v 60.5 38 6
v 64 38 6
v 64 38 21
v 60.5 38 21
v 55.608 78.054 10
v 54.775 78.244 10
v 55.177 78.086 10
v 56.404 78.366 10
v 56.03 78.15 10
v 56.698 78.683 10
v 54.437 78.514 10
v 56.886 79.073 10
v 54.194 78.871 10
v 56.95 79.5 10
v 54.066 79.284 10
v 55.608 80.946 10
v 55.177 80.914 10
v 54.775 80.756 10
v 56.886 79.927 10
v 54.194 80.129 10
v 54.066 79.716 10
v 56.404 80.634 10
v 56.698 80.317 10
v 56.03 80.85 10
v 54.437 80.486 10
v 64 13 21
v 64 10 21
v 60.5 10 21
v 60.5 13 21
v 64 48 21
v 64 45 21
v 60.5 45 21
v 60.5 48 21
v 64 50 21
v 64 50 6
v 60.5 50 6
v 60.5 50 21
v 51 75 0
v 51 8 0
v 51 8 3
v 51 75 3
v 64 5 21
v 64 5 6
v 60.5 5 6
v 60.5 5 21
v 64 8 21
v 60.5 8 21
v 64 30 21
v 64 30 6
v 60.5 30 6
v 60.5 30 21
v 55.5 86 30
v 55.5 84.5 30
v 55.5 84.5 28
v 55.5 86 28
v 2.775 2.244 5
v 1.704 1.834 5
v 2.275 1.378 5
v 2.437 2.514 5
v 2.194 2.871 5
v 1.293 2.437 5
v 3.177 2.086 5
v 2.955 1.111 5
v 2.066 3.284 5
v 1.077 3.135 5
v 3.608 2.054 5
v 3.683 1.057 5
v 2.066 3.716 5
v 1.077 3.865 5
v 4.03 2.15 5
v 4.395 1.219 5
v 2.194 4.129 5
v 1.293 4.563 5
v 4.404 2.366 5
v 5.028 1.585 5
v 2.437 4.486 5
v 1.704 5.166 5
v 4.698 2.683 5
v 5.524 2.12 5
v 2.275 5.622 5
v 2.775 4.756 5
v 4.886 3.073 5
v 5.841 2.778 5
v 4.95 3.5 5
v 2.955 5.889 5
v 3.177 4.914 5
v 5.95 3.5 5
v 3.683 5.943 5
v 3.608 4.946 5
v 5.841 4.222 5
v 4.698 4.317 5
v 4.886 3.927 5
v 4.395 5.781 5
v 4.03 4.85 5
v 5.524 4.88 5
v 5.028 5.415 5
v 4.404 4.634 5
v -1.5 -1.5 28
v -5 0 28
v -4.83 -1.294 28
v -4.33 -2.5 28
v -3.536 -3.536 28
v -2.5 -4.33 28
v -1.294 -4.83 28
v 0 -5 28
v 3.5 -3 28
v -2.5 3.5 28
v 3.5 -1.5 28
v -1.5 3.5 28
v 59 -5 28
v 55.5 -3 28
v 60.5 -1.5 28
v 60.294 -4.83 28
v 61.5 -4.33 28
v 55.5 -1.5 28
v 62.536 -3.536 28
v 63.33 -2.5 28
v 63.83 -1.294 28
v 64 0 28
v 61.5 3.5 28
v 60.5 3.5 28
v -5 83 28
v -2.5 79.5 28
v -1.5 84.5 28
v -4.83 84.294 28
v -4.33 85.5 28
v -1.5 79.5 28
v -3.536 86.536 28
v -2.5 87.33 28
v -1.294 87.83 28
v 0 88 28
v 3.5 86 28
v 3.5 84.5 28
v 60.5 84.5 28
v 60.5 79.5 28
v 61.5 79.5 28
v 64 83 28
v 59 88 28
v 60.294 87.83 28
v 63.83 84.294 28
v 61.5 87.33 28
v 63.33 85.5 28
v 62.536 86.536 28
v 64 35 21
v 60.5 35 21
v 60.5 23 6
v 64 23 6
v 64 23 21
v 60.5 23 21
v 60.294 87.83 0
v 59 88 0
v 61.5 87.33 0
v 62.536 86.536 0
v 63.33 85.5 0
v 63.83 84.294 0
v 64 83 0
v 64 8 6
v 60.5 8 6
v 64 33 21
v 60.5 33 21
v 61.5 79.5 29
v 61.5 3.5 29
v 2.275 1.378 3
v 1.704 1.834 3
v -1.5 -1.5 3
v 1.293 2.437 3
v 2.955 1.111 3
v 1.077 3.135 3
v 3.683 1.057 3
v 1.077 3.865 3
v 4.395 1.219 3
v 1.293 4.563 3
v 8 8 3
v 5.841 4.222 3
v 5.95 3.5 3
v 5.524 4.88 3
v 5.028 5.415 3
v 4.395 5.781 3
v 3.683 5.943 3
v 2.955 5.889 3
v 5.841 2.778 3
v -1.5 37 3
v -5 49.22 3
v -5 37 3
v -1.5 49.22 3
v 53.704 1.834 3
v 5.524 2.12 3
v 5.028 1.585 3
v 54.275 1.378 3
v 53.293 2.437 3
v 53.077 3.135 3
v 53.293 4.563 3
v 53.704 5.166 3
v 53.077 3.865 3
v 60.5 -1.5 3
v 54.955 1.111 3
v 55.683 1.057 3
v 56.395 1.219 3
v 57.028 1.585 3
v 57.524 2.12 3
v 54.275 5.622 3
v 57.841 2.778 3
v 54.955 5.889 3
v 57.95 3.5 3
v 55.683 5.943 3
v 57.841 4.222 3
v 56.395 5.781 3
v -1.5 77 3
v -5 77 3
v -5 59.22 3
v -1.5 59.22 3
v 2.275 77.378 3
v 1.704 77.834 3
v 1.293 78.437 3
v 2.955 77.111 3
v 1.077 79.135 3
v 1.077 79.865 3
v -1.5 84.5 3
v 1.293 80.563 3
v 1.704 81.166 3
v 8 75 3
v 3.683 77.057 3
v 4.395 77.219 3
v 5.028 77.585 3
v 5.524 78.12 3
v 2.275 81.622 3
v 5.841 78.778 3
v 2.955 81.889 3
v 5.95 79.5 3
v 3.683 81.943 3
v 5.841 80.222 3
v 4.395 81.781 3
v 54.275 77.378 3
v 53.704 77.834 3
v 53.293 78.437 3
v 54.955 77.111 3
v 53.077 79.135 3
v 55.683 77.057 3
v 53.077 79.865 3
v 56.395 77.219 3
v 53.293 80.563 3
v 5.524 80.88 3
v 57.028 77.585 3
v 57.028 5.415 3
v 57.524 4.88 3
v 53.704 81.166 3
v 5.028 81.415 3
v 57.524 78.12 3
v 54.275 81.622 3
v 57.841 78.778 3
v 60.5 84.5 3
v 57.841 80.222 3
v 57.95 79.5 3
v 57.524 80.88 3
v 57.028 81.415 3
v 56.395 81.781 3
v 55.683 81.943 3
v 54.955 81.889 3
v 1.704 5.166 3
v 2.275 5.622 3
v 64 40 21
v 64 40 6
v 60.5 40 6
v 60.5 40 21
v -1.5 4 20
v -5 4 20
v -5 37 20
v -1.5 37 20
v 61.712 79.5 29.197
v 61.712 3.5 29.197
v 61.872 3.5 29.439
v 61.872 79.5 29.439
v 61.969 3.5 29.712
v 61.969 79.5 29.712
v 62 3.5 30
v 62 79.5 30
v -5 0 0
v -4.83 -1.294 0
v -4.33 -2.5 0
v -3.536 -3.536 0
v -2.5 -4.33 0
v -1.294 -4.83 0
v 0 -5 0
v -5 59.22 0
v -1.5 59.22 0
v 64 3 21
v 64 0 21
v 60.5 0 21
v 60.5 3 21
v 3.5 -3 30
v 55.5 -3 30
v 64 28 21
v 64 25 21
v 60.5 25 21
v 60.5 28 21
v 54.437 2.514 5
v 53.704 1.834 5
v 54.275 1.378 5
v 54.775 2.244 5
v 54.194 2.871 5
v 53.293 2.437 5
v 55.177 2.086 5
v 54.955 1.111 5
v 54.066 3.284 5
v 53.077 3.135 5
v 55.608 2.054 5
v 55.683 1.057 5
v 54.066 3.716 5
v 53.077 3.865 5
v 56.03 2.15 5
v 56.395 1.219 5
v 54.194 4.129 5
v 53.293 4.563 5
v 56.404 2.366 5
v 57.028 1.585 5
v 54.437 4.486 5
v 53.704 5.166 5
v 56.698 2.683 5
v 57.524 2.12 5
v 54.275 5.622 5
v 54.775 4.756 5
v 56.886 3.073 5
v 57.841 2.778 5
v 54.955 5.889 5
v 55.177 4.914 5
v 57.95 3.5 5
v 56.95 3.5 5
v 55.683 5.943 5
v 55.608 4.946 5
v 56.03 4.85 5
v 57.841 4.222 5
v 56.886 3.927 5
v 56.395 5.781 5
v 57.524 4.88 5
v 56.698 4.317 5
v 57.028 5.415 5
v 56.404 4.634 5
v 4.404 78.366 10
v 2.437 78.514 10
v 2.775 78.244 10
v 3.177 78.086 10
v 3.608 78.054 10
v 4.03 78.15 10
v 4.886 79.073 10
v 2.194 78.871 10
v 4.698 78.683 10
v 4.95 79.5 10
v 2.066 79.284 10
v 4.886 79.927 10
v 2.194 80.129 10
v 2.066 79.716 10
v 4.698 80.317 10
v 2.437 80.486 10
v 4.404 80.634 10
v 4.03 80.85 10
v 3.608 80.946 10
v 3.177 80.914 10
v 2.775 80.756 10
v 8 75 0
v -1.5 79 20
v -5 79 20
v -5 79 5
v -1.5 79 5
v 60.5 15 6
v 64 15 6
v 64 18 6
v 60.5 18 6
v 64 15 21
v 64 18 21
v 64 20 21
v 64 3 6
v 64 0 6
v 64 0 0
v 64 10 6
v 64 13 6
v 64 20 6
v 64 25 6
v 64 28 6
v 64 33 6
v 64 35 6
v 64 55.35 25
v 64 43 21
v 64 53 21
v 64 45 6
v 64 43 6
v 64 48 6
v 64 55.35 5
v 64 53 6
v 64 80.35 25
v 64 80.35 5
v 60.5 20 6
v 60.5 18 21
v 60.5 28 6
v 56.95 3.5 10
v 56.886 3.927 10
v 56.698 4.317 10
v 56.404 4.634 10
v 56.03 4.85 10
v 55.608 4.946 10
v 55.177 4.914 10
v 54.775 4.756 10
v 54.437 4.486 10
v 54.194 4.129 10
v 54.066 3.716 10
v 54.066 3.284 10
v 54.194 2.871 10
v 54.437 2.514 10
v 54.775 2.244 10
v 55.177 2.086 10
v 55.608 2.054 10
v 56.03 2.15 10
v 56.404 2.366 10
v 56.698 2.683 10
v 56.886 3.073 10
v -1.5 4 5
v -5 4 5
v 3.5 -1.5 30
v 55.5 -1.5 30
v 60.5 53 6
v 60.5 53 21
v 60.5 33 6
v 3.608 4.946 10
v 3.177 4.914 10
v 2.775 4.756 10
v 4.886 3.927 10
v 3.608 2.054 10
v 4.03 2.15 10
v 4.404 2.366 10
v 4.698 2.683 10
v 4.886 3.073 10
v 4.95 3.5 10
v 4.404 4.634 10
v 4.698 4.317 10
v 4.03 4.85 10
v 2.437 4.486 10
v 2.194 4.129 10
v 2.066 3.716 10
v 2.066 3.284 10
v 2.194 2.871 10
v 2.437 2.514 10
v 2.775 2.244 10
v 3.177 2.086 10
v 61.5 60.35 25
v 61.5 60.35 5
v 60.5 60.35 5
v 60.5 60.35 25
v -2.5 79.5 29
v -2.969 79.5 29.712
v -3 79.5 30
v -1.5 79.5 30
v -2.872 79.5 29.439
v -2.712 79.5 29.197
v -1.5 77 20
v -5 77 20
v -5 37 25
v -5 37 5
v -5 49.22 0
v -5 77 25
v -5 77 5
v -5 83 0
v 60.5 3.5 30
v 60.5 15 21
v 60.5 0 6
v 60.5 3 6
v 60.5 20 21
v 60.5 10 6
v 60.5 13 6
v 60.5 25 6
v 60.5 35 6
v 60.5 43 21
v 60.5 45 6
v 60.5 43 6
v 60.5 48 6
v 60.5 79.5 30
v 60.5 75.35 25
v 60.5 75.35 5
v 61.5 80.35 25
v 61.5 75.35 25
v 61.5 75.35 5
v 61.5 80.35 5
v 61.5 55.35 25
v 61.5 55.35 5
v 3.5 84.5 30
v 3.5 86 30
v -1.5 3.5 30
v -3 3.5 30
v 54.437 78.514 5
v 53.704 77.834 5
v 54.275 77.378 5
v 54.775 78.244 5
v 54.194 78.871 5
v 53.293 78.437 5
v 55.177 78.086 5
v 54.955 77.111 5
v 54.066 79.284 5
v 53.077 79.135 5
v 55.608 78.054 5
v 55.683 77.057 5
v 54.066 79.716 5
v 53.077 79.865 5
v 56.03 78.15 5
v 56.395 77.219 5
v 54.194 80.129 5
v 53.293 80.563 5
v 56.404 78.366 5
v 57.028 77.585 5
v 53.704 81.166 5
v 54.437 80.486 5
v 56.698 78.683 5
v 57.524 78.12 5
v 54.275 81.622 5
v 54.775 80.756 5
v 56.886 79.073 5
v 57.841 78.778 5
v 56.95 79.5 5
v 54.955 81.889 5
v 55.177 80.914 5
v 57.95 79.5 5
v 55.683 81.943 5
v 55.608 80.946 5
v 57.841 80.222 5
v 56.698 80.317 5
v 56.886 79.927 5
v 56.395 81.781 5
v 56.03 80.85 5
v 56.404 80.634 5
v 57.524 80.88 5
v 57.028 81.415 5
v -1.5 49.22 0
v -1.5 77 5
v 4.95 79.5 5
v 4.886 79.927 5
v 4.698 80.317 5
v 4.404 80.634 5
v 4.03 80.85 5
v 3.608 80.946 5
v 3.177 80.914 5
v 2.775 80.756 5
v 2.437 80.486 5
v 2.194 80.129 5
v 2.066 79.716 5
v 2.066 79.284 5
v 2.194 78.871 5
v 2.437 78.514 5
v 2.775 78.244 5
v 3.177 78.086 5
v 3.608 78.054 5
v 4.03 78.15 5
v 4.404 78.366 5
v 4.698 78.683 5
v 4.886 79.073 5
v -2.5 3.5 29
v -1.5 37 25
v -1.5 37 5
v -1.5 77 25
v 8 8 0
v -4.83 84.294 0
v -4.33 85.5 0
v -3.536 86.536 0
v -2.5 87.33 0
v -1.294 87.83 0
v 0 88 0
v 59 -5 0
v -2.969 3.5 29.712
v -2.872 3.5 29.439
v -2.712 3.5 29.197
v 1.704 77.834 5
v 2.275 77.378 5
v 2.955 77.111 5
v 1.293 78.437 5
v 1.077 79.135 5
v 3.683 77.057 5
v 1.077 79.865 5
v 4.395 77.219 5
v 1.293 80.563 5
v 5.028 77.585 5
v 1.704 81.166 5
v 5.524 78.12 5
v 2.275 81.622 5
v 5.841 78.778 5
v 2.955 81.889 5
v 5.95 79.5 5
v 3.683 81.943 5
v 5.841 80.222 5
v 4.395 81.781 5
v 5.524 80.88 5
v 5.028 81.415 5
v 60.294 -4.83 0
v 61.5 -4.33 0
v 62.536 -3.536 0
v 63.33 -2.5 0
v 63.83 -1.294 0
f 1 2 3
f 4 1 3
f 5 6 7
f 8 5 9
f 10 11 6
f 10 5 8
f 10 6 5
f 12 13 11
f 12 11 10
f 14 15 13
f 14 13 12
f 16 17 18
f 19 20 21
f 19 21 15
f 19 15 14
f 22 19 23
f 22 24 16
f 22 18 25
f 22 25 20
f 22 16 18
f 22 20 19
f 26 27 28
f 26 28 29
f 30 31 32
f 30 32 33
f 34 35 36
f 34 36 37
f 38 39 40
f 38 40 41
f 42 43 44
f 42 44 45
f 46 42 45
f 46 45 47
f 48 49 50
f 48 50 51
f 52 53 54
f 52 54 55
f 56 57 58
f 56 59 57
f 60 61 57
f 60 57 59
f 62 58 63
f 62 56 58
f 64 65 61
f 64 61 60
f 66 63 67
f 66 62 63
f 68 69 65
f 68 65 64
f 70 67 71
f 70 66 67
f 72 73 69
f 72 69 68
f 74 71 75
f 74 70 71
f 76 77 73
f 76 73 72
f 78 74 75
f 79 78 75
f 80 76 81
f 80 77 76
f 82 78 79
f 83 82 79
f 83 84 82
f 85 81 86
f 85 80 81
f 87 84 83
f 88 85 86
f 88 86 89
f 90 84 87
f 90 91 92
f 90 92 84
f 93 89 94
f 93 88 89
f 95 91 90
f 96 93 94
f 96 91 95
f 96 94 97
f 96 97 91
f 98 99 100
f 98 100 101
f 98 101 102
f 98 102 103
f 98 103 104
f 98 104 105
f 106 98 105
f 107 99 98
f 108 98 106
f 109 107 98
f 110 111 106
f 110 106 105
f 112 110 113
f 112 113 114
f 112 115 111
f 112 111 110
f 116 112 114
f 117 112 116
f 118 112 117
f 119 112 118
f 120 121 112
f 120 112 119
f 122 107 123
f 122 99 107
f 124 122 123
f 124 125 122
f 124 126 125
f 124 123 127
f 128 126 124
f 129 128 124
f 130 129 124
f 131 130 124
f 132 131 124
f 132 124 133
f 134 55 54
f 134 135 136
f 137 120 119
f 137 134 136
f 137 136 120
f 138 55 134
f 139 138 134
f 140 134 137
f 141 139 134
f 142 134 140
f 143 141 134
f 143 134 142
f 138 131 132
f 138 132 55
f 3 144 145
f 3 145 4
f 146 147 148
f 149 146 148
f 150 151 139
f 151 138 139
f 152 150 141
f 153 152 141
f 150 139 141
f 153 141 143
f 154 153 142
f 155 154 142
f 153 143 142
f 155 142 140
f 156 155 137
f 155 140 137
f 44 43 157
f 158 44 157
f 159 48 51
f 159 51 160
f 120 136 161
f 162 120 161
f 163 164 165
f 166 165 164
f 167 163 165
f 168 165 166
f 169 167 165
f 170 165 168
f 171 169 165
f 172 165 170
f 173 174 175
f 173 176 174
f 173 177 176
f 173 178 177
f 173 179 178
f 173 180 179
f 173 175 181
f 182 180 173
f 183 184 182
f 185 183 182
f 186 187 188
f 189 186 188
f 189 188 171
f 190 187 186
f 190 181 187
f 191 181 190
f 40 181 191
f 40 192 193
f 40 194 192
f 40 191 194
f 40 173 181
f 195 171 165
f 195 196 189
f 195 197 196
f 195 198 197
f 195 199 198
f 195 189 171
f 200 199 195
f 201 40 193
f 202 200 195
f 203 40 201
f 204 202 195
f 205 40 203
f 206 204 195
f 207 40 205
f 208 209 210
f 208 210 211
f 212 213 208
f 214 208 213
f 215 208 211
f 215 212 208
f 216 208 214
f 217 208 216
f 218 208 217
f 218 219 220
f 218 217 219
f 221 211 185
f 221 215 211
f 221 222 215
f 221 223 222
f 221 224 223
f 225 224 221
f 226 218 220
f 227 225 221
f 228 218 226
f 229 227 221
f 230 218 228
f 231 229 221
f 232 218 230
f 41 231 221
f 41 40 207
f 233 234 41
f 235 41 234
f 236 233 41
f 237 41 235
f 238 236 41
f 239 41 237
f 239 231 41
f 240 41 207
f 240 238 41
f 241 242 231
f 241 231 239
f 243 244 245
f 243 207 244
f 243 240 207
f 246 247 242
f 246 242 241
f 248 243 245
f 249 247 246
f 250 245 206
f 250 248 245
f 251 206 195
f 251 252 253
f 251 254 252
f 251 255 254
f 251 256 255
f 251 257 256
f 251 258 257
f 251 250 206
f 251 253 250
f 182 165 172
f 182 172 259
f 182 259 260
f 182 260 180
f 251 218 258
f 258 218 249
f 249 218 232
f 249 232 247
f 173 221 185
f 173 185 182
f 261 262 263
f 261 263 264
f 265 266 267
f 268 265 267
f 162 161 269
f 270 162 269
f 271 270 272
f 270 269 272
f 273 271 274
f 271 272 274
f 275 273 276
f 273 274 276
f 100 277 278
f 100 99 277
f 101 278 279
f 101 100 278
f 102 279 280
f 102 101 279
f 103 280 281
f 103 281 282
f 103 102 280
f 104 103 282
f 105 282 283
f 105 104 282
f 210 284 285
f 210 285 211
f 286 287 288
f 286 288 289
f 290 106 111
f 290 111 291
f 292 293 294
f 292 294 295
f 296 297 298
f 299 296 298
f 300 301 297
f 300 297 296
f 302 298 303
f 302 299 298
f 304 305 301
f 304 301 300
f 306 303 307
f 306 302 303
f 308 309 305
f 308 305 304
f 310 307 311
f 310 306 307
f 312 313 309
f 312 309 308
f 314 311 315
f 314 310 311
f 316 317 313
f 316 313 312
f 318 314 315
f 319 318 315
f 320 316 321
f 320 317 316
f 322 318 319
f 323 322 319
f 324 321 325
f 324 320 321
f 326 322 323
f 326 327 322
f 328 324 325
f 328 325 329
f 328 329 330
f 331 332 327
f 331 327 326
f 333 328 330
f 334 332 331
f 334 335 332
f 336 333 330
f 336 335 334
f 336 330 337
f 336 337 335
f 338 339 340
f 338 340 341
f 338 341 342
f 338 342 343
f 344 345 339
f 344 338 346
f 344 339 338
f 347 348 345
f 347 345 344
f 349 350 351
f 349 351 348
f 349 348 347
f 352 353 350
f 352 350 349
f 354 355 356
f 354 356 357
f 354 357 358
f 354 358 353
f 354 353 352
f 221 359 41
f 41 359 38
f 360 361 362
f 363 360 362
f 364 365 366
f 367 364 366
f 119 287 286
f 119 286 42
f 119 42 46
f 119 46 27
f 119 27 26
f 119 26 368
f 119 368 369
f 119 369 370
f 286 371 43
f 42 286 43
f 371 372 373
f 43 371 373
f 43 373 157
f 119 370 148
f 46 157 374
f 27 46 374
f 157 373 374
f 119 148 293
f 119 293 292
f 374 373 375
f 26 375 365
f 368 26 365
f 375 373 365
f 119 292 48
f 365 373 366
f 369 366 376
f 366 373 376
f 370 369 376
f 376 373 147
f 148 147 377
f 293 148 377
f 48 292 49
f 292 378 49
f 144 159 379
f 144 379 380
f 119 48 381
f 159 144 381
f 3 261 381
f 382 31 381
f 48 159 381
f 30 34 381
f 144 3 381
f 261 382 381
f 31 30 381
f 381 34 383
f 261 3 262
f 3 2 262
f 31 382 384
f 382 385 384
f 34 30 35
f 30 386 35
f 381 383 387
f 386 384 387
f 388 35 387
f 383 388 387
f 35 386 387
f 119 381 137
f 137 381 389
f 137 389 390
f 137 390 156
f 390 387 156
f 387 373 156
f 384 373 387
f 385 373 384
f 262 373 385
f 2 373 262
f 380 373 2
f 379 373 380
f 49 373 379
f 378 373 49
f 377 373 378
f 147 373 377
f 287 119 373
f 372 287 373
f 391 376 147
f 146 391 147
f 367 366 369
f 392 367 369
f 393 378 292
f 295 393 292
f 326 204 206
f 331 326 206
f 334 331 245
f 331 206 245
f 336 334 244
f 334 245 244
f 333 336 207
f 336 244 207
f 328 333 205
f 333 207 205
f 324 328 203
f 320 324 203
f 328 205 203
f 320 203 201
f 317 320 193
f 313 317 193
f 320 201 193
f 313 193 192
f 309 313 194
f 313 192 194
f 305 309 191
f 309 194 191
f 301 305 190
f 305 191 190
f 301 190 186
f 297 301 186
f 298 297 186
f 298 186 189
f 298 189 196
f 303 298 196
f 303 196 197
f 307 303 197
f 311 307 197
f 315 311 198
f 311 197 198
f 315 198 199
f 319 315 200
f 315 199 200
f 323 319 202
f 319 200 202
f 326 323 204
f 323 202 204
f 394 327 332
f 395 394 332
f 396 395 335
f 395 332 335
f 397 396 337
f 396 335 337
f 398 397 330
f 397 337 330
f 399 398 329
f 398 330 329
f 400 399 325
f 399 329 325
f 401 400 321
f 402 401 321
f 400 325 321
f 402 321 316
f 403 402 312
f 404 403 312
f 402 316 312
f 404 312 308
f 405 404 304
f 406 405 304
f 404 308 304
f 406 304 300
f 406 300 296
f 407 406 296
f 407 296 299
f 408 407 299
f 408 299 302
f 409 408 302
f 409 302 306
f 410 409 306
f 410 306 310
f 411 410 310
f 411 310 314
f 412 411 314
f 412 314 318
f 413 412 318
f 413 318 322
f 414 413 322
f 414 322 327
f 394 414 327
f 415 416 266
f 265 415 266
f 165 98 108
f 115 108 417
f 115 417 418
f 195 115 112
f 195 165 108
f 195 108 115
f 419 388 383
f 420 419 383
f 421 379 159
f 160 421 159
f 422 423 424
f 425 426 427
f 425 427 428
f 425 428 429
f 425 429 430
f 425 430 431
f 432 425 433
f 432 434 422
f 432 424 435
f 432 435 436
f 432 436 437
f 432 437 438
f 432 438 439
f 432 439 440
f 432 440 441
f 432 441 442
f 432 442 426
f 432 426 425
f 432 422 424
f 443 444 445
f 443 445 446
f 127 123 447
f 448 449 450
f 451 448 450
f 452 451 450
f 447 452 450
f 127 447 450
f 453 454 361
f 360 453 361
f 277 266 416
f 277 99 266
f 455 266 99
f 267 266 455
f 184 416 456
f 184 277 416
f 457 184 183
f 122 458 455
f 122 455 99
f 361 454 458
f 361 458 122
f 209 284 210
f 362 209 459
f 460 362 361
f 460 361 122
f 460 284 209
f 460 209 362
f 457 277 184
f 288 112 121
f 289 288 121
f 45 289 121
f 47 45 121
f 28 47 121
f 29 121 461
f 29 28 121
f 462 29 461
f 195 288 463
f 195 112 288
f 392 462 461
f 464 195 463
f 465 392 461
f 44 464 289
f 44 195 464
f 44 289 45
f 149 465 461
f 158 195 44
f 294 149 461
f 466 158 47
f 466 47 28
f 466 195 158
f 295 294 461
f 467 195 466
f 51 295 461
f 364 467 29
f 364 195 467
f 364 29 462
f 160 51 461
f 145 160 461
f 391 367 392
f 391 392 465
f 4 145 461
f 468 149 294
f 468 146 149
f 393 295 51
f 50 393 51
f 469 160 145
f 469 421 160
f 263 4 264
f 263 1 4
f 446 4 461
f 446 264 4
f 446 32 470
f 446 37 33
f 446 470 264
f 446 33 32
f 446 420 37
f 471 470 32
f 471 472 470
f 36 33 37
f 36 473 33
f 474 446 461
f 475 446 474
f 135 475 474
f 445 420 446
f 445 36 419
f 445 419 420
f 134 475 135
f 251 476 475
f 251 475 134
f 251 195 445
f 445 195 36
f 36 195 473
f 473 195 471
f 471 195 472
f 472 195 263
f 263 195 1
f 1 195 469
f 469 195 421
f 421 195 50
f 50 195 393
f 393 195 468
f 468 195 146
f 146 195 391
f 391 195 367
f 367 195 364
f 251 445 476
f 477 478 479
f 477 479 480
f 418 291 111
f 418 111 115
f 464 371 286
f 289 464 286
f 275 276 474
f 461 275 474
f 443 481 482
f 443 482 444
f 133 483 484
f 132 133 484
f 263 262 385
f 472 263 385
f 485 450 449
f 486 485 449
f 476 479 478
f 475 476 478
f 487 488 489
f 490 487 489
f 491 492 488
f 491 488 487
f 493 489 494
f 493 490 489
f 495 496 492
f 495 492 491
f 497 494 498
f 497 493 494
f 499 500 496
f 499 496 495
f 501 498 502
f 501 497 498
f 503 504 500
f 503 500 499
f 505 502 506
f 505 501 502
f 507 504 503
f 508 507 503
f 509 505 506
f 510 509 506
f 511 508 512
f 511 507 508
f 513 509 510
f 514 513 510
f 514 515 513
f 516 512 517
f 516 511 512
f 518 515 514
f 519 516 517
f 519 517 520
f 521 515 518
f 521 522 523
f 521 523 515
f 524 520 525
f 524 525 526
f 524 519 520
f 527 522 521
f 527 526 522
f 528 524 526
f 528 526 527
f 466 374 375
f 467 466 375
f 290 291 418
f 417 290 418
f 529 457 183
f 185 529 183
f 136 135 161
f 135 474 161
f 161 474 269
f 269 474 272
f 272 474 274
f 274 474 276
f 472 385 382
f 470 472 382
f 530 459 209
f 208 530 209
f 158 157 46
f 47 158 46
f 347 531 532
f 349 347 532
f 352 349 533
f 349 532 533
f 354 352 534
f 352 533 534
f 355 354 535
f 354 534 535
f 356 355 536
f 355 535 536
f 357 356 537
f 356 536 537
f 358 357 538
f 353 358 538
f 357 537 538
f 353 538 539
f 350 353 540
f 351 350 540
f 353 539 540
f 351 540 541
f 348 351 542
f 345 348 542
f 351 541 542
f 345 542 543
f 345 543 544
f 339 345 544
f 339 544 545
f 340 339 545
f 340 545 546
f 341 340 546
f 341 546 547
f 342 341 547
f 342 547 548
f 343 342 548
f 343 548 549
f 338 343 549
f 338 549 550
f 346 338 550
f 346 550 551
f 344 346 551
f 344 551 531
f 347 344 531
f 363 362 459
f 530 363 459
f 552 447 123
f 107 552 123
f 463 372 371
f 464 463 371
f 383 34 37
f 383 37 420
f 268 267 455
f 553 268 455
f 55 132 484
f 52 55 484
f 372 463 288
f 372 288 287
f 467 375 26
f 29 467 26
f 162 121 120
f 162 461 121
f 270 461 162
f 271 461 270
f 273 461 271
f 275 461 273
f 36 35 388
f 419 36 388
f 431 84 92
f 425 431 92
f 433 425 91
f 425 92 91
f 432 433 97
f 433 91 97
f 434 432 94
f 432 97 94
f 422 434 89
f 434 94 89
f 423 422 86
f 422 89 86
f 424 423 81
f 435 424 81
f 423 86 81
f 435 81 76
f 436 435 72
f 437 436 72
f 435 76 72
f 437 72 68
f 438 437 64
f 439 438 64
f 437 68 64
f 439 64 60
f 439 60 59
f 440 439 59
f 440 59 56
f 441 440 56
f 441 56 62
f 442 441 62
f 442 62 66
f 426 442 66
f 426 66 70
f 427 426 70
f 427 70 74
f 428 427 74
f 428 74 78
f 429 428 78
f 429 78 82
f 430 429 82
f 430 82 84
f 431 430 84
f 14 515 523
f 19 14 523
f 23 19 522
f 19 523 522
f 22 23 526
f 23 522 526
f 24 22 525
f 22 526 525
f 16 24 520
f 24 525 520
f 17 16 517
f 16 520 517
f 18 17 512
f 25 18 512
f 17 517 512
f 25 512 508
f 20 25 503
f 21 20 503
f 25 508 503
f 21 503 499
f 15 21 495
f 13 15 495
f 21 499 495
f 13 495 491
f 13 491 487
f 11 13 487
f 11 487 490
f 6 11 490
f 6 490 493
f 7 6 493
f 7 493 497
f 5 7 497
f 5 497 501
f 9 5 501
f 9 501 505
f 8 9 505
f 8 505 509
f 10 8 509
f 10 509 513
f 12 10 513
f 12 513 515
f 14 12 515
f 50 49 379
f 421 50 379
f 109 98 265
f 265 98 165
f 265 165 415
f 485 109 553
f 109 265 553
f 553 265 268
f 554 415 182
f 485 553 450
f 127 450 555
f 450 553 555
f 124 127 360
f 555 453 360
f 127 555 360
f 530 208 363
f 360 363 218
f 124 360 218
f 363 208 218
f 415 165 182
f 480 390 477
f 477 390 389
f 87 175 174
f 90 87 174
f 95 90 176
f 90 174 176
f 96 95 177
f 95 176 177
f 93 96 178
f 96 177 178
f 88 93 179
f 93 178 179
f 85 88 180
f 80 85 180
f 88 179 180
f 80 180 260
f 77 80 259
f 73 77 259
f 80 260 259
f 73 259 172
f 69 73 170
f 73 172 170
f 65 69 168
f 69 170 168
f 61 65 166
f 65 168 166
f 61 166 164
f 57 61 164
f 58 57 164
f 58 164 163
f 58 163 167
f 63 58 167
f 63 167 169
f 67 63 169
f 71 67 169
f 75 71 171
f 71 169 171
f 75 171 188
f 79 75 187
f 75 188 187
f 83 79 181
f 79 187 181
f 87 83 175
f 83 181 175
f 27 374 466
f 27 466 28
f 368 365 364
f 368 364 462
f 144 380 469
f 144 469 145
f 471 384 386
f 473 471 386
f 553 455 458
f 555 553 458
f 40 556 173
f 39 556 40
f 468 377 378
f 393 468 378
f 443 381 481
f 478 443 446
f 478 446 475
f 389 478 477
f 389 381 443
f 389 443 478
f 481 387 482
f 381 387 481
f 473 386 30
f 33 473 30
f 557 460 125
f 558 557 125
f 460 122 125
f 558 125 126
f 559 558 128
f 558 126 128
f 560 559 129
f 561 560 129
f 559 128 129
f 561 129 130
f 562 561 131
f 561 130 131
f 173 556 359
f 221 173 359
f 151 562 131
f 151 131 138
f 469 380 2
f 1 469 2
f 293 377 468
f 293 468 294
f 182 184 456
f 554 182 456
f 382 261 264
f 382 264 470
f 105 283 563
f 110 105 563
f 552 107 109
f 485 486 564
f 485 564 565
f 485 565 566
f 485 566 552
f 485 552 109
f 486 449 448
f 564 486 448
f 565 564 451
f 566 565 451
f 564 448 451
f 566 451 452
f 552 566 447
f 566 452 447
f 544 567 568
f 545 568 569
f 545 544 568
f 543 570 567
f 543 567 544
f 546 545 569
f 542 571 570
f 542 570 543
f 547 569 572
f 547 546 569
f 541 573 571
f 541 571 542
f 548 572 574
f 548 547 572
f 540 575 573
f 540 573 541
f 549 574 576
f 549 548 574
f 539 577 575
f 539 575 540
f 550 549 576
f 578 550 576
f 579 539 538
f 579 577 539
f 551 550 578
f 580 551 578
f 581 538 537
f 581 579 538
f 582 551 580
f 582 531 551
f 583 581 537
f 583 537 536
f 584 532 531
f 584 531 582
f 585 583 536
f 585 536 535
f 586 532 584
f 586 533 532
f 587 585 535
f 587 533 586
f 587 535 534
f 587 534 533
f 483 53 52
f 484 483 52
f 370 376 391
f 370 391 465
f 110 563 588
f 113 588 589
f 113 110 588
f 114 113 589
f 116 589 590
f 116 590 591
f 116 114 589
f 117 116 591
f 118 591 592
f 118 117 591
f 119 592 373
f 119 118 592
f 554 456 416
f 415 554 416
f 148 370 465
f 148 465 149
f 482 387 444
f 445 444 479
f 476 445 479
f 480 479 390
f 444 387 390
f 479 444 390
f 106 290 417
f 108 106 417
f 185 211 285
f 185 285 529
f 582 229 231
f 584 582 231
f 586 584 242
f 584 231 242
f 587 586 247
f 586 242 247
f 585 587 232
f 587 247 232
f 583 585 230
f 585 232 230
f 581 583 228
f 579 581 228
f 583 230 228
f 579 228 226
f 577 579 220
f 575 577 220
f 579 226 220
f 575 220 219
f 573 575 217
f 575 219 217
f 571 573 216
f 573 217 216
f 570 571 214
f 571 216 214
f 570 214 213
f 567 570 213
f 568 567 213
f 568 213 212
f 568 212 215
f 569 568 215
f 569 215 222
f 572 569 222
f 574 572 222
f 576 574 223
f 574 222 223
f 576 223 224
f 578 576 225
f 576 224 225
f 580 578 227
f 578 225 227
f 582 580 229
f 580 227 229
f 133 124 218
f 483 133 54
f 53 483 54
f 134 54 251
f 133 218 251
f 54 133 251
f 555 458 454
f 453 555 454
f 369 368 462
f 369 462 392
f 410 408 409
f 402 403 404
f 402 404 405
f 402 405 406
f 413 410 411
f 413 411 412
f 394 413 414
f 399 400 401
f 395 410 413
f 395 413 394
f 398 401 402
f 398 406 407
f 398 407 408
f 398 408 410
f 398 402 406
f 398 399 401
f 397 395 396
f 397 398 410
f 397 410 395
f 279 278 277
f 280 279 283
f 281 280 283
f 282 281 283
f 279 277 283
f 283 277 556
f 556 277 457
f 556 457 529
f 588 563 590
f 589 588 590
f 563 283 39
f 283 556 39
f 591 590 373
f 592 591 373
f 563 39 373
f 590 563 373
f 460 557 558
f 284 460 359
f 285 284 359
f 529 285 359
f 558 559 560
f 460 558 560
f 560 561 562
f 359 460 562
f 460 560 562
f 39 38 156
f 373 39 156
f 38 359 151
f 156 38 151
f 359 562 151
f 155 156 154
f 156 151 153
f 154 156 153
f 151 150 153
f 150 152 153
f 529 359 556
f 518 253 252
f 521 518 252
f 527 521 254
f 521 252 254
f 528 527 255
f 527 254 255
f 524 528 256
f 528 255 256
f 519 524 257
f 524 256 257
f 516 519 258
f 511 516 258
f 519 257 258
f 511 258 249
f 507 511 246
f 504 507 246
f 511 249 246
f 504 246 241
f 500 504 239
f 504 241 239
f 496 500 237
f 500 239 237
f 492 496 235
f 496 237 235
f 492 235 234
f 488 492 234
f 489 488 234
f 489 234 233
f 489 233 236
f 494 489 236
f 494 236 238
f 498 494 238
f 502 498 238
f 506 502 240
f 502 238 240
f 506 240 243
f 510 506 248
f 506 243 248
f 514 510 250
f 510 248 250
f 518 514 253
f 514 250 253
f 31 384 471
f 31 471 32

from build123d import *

# Parameters (mm, degrees)
F0_W      = 59
F0_H      = 83
F0_W_2    = 43
F0_H_2    = 67
F1_DEPTH  = 3
F2_R      = 1.45
F3_DEPTH  = 7
F4_W      = 69
F4_H      = 93
F4_W_2    = 59
F4_H_2    = 83
F5_DEPTH  = 28
F6_R      = 2.45
F7_DEPTH  = 2
F9_DEPTH  = 5
F10_W     = 15
F10_H     = 20
F10_W_2   = 3
F10_H_2   = 15
F11_DEPTH = 5
F12_W     = 62
F12_H     = 86
F12_R     = 2.5
F13_DEPTH = 25
F15_W     = 10
F15_H     = 3
F16_DEPTH = 3.5
F17_W     = 25
F17_H     = 20
F18_DEPTH = 2.5
F21_DEPTH = 76
F23_W     = 1.5
F23_H     = 2
F24_DEPTH = 52
F25_R     = 4.99999


# Not quite as in the source:
# - a fillet or chamfer is up to 0.001 mm smaller than in the source, because OpenCascade refuses the exact size


with BuildPart() as f1:
    # F0 (on Top) → F1 (new body)
    with BuildSketch(Plane.XY):
        with Locations((29.5, 41.5)):
            Rectangle(F0_W, F0_H)
        with Locations((29.5, 41.5)):
            Rectangle(F0_W_2, F0_H_2, mode=Mode.SUBTRACT)
    extrude(amount=F1_DEPTH)

    # F2 (on face) → F3 (join)
    with BuildSketch(Plane.XY.offset(3)):
        with Locations((3.5, 3.5)):
            Circle(F2_R)
        with Locations((55.5, 3.5)):
            Circle(F2_R)
        with Locations((3.5, 79.5)):
            Circle(F2_R)
        with Locations((55.5, 79.5)):
            Circle(F2_R)
    extrude(amount=F3_DEPTH)

    # F4 (on Top) → F5 (join)
    with BuildSketch(Plane.XY):
        with Locations((29.5, 41.5)):
            Rectangle(F4_W, F4_H)
        with Locations((29.5, 41.5)):
            Rectangle(F4_W_2, F4_H_2, mode=Mode.SUBTRACT)
    extrude(amount=F5_DEPTH)

    # F6 (on face) → F7 (join)
    with BuildSketch(Plane.XY.offset(3)):
        with Locations((3.5, 79.5)):
            Circle(F6_R)
        with Locations((55.5, 79.5)):
            Circle(F6_R)
        with Locations((55.5, 3.5)):
            Circle(F6_R)
        with Locations((3.5, 3.5)):
            Circle(F6_R)
    extrude(amount=F7_DEPTH)

    # F8 (on face) → F9 (cut, through all)
    with BuildSketch(Plane(origin=(-5, 0, 0), x_dir=(0, -1, 0), z_dir=(-1, 0, 0))):
        Polygon((-79, 20), (-79, 5), (-77, 5), (-77, 3), (-37, 3), (-37, 5), (-4, 5), (-4, 20), (-37, 20), (-37, 25), (-77, 25), (-77, 20), align=None)
    extrude(amount=-F9_DEPTH, mode=Mode.SUBTRACT)

    # F10 (on face) → F11 (cut, through all)
    with BuildSketch(Plane.YZ.offset(64)):
        with Locations((67.85, 15)):
            Rectangle(F10_W, F10_H)
        with Locations((1.5, 13.5)):
            Rectangle(F10_W_2, F10_H_2)
        with Locations((6.5, 13.5)):
            Rectangle(F10_W_2, F10_H_2)
        with Locations((11.5, 13.5)):
            Rectangle(F10_W_2, F10_H_2)
        with Locations((16.5, 13.5)):
            Rectangle(F10_W_2, F10_H_2)
        with Locations((21.5, 13.5)):
            Rectangle(F10_W_2, F10_H_2)
        with Locations((26.5, 13.5)):
            Rectangle(F10_W_2, F10_H_2)
        with Locations((31.5, 13.5)):
            Rectangle(F10_W_2, F10_H_2)
        with Locations((36.5, 13.5)):
            Rectangle(F10_W_2, F10_H_2)
        with Locations((41.5, 13.5)):
            Rectangle(F10_W_2, F10_H_2)
        with Locations((46.5, 13.5)):
            Rectangle(F10_W_2, F10_H_2)
        with Locations((51.5, 13.5)):
            Rectangle(F10_W_2, F10_H_2)
    extrude(amount=-F11_DEPTH, mode=Mode.SUBTRACT)

    # F12 (on face) → F13 (cut)
    with BuildSketch(Plane.XY.offset(3)):
        with Locations((29.5, 41.5)):
            Rectangle(F12_W, F12_H)
        with Locations((3.5, 3.5)):
            Circle(F12_R, mode=Mode.SUBTRACT)
        with Locations((55.5, 3.5)):
            Circle(F12_R, mode=Mode.SUBTRACT)
        with Locations((3.5, 79.5)):
            Circle(F12_R, mode=Mode.SUBTRACT)
        with Locations((55.5, 79.5)):
            Circle(F12_R, mode=Mode.SUBTRACT)
    extrude(amount=F13_DEPTH, mode=Mode.SUBTRACT)

    # F15 (on face) → F16 (cut)
    with BuildSketch(Plane(origin=(-5, 0, 0), x_dir=(0, -1, 0), z_dir=(-1, 0, 0))):
        with Locations((-54.22, 1.5)):
            Rectangle(F15_W, F15_H)
    extrude(amount=-F16_DEPTH, mode=Mode.SUBTRACT)

    # F17 (on face) → F18 (cut)
    with BuildSketch(Plane.YZ.offset(64)):
        with Locations((67.85, 15)):
            Rectangle(F17_W, F17_H)
    extrude(amount=-F18_DEPTH, mode=Mode.SUBTRACT)

    # F20 (on offset) → F21 (join)
    with BuildSketch(Plane.XZ.offset(-79.5)):
        with BuildLine():
            Line((-2.5, 29), (-2.5, 28))
            Line((-2.5, 28), (-1.5, 28))
            Line((-1.5, 28), (-1.5, 30))
            Line((-1.5, 30), (-3, 30))
            ThreePointArc((-3, 30), (-2.8716037917, 29.4391981041), (-2.5, 29))
        make_face()
        with BuildLine():
            Line((60.5, 28), (61.5, 28))
            Line((61.5, 28), (61.5, 29))
            ThreePointArc((61.5, 29), (61.8716037917, 29.4391981041), (62, 30))
            Line((62, 30), (60.5, 30))
            Line((60.5, 30), (60.5, 28))
        make_face()
    extrude(amount=F21_DEPTH)

    # F23 (on offset) → F24 (join)
    with BuildSketch(Plane.YZ.offset(3.5)):
        with Locations((-2.25, 29)):
            Rectangle(F23_W, F23_H)
        with Locations((85.25, 29)):
            Rectangle(F23_W, F23_H)
    extrude(amount=F24_DEPTH)

    # F25 (radius 5 in the source; OpenCascade refuses exactly that, so slightly less here)
    f25_edges = [f1.edges().sort_by_distance(p)[0] for p in [
        (-5, -5, 14),
        (64, -5, 14),
        (64, 88, 14),
        (-5, 88, 14),
    ]]
    fillet(f25_edges, radius=F25_R)


solid = f1.part
